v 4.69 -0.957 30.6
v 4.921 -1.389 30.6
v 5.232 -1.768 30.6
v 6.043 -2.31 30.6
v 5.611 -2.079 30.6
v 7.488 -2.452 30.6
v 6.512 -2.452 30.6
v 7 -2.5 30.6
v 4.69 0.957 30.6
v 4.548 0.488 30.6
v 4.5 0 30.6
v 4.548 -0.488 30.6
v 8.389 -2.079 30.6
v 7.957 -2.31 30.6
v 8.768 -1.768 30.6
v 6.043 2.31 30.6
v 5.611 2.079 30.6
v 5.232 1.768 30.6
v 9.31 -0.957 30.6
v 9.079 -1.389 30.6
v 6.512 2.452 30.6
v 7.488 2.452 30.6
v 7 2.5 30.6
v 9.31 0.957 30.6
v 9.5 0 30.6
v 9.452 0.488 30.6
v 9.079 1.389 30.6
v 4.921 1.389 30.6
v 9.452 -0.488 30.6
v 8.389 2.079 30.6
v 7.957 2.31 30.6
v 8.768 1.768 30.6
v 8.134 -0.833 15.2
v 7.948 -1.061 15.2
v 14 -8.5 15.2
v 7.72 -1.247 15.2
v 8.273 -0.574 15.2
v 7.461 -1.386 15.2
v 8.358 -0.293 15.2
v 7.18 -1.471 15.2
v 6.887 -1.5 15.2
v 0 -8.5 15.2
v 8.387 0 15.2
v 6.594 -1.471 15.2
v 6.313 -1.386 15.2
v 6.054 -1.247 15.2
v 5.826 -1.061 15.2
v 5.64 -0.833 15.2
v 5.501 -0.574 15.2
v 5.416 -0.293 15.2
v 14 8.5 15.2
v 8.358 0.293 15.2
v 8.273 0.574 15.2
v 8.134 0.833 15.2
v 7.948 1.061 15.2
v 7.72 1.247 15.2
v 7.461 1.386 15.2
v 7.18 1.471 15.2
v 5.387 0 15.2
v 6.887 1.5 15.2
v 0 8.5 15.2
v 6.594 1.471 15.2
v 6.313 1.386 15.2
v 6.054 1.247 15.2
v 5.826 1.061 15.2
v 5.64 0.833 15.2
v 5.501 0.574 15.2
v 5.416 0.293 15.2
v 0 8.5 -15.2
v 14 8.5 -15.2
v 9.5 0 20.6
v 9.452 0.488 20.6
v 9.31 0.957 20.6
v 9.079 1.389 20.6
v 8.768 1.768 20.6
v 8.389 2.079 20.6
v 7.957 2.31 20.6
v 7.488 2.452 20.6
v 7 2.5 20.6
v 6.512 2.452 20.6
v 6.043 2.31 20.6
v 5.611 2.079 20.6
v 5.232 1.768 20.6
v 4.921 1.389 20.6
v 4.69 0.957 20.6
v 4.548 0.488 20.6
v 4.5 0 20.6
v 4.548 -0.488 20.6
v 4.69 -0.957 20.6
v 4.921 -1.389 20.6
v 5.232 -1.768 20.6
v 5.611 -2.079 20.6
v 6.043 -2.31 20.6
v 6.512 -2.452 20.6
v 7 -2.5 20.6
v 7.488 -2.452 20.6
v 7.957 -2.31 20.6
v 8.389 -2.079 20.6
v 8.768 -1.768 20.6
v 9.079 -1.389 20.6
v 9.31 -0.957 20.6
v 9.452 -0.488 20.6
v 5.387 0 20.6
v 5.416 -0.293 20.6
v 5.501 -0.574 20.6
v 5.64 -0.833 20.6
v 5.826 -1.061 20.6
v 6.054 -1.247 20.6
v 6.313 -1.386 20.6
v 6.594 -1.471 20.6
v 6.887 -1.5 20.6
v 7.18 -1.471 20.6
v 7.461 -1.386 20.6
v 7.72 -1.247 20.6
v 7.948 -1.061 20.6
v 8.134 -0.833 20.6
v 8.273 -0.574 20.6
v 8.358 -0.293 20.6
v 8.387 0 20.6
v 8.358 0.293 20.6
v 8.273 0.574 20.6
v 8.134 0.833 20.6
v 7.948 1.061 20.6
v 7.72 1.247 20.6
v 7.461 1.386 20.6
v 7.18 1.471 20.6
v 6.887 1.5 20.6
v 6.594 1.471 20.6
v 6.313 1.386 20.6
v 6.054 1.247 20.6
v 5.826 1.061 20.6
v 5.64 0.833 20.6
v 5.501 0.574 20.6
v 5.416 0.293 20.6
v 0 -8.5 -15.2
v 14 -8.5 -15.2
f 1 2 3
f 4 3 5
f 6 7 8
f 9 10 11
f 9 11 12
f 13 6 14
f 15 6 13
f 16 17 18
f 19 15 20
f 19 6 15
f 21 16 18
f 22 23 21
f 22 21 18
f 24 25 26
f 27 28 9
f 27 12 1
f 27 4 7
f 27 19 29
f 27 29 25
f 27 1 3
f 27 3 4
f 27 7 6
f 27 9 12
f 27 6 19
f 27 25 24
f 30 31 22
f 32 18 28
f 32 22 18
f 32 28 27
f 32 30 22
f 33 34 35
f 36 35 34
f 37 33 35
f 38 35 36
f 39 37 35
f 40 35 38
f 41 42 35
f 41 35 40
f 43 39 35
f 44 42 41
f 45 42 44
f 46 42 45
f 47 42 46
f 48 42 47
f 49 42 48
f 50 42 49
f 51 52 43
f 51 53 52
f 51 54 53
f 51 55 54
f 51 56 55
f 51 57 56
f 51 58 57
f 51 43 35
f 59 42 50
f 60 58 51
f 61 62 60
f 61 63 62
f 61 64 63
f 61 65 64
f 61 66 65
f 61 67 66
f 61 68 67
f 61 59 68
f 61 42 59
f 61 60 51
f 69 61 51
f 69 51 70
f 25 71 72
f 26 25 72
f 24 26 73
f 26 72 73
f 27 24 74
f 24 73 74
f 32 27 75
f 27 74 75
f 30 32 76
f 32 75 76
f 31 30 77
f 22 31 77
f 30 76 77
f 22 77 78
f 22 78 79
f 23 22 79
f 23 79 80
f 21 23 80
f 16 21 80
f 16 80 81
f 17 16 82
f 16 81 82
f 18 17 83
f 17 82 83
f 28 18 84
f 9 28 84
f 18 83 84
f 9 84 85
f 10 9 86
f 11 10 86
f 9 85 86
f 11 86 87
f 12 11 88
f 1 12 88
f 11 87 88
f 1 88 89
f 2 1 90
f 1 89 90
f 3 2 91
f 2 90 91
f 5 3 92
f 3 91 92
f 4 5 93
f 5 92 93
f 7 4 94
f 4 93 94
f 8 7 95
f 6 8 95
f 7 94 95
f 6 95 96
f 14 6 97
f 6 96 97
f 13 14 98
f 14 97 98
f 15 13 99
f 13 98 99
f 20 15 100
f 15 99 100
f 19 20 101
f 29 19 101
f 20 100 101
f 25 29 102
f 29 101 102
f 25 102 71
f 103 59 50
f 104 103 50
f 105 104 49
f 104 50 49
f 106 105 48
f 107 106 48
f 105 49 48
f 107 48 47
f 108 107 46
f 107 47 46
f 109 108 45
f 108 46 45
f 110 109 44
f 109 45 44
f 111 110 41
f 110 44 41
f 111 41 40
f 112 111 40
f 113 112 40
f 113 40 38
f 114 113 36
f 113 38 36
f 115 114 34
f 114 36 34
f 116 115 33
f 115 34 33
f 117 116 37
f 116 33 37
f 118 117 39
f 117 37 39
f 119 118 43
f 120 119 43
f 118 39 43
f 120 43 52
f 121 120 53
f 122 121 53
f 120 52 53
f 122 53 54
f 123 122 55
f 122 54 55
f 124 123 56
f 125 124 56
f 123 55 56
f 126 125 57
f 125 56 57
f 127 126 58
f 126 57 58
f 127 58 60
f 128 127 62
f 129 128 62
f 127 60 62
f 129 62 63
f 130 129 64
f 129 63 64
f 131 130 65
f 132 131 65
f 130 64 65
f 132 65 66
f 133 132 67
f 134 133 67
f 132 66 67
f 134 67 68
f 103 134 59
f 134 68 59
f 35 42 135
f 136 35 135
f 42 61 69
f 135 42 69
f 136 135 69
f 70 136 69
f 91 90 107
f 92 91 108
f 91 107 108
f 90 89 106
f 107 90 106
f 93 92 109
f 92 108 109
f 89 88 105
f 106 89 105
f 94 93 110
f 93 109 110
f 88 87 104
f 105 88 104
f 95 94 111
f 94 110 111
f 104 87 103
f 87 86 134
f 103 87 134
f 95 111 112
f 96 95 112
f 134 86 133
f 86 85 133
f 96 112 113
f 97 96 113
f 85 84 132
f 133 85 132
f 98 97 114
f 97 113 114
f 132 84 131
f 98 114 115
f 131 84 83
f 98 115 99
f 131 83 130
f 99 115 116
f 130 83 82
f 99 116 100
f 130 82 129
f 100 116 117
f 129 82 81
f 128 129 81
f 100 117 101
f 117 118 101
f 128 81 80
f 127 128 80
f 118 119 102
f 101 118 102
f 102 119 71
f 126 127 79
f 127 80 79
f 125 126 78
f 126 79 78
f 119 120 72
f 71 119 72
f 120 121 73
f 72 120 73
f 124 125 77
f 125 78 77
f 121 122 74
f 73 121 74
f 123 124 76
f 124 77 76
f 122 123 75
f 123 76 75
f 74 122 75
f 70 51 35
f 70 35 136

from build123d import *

# Parameters (mm, degrees)
SKETCH1_W           = 30.4
SKETCH1_H           = 17
BOSS_EXTRUDE1_DEPTH = 14
SKETCH2_R           = 1.5
BOSS_EXTRUDE2_DEPTH = 5.4
SKETCH3_R           = 2.5
BOSS_EXTRUDE3_DEPTH = 10


with BuildPart() as part:
    # Sketch1 → Boss-Extrude1 (new body)
    with BuildSketch(Plane(origin=(0, 0, 0), x_dir=(0, 0, -1), z_dir=(1, 0, 0))):
        Rectangle(SKETCH1_W, SKETCH1_H)
    extrude(amount=BOSS_EXTRUDE1_DEPTH)

    # Sketch2 → Boss-Extrude2 (add)
    with BuildSketch(Plane.XY.offset(15.2)):
        with Locations(Location((6.88711981, 0, 0), (0, 0, 180))):
            Circle(SKETCH2_R)
    extrude(amount=BOSS_EXTRUDE2_DEPTH)

    # Sketch3 → Boss-Extrude3 (add)
    with BuildSketch(Plane.XY.offset(20.6)):
        with Locations((7, 0)):
            Circle(SKETCH3_R)
    extrude(amount=BOSS_EXTRUDE3_DEPTH)


solid = part.part
